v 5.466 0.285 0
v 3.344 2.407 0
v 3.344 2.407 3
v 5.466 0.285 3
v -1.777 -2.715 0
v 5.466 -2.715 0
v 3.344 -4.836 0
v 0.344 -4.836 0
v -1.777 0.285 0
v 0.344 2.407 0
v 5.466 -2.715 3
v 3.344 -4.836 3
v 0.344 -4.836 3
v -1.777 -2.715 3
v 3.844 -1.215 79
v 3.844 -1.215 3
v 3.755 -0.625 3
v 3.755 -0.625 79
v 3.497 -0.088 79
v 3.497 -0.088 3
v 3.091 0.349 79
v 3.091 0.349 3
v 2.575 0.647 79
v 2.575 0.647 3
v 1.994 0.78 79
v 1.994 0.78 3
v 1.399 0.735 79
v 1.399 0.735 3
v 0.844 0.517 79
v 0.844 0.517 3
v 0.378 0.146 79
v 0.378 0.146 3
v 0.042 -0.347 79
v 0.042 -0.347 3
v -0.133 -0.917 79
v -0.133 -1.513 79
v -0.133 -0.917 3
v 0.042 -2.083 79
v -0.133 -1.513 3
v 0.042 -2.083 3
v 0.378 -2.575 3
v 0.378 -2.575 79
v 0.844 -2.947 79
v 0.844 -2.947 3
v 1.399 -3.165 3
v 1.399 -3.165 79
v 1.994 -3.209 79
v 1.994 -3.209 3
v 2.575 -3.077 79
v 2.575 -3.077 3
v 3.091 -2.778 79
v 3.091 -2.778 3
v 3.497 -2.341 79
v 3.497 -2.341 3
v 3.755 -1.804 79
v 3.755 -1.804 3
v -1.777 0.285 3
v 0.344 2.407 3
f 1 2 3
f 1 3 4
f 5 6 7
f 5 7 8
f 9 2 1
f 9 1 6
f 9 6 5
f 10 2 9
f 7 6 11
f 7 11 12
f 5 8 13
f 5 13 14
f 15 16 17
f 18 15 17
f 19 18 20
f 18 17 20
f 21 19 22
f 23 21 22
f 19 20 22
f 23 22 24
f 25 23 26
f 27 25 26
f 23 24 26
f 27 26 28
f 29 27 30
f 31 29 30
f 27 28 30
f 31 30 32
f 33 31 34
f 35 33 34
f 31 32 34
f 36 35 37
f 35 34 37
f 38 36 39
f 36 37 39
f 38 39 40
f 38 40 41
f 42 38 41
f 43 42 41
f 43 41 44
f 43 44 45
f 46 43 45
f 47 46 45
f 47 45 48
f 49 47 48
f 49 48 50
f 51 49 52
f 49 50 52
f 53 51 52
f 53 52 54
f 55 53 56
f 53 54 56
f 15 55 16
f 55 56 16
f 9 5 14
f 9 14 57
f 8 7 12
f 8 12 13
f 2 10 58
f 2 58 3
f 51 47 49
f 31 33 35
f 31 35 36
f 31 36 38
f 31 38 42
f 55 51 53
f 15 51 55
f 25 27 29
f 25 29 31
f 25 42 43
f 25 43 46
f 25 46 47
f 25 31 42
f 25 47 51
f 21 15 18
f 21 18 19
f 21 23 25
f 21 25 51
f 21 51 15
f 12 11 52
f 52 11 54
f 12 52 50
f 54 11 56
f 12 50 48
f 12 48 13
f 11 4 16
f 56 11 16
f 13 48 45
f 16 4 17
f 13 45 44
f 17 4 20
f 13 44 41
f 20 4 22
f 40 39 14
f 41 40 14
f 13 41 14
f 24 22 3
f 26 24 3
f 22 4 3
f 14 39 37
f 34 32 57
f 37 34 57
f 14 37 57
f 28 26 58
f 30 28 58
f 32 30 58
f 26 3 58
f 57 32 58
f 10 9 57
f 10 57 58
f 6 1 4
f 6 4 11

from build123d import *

# Parameters (mm, degrees)
AUFSATZ_LINEAR_AUSTRAGEN1_DEPTH = 3
SKIZZE2_R                       = 2
AUFSATZ_LINEAR_AUSTRAGEN2_DEPTH = 76


with BuildPart() as part:
    # Skizze1 → Aufsatz-Linear austragen1 (new body)
    with BuildSketch(Plane.XY):
        Polygon((-1.777039873, 0.285182154), (0.34428047, 2.406502498), (3.34428047, 2.406502498), (5.465600814, 0.285182154), (5.465600814, -2.714817846), (3.34428047, -4.83613819), (0.34428047, -4.83613819), (-1.777039873, -2.714817846), align=None)
    extrude(amount=AUFSATZ_LINEAR_AUSTRAGEN1_DEPTH)

    # Skizze2 → Aufsatz-Linear austragen2 (add)
    with BuildSketch(Plane.XY.offset(3)):
        with Locations((1.84428047, -1.214817846)):
            Circle(SKIZZE2_R)
    extrude(amount=AUFSATZ_LINEAR_AUSTRAGEN2_DEPTH)


solid = part.part
